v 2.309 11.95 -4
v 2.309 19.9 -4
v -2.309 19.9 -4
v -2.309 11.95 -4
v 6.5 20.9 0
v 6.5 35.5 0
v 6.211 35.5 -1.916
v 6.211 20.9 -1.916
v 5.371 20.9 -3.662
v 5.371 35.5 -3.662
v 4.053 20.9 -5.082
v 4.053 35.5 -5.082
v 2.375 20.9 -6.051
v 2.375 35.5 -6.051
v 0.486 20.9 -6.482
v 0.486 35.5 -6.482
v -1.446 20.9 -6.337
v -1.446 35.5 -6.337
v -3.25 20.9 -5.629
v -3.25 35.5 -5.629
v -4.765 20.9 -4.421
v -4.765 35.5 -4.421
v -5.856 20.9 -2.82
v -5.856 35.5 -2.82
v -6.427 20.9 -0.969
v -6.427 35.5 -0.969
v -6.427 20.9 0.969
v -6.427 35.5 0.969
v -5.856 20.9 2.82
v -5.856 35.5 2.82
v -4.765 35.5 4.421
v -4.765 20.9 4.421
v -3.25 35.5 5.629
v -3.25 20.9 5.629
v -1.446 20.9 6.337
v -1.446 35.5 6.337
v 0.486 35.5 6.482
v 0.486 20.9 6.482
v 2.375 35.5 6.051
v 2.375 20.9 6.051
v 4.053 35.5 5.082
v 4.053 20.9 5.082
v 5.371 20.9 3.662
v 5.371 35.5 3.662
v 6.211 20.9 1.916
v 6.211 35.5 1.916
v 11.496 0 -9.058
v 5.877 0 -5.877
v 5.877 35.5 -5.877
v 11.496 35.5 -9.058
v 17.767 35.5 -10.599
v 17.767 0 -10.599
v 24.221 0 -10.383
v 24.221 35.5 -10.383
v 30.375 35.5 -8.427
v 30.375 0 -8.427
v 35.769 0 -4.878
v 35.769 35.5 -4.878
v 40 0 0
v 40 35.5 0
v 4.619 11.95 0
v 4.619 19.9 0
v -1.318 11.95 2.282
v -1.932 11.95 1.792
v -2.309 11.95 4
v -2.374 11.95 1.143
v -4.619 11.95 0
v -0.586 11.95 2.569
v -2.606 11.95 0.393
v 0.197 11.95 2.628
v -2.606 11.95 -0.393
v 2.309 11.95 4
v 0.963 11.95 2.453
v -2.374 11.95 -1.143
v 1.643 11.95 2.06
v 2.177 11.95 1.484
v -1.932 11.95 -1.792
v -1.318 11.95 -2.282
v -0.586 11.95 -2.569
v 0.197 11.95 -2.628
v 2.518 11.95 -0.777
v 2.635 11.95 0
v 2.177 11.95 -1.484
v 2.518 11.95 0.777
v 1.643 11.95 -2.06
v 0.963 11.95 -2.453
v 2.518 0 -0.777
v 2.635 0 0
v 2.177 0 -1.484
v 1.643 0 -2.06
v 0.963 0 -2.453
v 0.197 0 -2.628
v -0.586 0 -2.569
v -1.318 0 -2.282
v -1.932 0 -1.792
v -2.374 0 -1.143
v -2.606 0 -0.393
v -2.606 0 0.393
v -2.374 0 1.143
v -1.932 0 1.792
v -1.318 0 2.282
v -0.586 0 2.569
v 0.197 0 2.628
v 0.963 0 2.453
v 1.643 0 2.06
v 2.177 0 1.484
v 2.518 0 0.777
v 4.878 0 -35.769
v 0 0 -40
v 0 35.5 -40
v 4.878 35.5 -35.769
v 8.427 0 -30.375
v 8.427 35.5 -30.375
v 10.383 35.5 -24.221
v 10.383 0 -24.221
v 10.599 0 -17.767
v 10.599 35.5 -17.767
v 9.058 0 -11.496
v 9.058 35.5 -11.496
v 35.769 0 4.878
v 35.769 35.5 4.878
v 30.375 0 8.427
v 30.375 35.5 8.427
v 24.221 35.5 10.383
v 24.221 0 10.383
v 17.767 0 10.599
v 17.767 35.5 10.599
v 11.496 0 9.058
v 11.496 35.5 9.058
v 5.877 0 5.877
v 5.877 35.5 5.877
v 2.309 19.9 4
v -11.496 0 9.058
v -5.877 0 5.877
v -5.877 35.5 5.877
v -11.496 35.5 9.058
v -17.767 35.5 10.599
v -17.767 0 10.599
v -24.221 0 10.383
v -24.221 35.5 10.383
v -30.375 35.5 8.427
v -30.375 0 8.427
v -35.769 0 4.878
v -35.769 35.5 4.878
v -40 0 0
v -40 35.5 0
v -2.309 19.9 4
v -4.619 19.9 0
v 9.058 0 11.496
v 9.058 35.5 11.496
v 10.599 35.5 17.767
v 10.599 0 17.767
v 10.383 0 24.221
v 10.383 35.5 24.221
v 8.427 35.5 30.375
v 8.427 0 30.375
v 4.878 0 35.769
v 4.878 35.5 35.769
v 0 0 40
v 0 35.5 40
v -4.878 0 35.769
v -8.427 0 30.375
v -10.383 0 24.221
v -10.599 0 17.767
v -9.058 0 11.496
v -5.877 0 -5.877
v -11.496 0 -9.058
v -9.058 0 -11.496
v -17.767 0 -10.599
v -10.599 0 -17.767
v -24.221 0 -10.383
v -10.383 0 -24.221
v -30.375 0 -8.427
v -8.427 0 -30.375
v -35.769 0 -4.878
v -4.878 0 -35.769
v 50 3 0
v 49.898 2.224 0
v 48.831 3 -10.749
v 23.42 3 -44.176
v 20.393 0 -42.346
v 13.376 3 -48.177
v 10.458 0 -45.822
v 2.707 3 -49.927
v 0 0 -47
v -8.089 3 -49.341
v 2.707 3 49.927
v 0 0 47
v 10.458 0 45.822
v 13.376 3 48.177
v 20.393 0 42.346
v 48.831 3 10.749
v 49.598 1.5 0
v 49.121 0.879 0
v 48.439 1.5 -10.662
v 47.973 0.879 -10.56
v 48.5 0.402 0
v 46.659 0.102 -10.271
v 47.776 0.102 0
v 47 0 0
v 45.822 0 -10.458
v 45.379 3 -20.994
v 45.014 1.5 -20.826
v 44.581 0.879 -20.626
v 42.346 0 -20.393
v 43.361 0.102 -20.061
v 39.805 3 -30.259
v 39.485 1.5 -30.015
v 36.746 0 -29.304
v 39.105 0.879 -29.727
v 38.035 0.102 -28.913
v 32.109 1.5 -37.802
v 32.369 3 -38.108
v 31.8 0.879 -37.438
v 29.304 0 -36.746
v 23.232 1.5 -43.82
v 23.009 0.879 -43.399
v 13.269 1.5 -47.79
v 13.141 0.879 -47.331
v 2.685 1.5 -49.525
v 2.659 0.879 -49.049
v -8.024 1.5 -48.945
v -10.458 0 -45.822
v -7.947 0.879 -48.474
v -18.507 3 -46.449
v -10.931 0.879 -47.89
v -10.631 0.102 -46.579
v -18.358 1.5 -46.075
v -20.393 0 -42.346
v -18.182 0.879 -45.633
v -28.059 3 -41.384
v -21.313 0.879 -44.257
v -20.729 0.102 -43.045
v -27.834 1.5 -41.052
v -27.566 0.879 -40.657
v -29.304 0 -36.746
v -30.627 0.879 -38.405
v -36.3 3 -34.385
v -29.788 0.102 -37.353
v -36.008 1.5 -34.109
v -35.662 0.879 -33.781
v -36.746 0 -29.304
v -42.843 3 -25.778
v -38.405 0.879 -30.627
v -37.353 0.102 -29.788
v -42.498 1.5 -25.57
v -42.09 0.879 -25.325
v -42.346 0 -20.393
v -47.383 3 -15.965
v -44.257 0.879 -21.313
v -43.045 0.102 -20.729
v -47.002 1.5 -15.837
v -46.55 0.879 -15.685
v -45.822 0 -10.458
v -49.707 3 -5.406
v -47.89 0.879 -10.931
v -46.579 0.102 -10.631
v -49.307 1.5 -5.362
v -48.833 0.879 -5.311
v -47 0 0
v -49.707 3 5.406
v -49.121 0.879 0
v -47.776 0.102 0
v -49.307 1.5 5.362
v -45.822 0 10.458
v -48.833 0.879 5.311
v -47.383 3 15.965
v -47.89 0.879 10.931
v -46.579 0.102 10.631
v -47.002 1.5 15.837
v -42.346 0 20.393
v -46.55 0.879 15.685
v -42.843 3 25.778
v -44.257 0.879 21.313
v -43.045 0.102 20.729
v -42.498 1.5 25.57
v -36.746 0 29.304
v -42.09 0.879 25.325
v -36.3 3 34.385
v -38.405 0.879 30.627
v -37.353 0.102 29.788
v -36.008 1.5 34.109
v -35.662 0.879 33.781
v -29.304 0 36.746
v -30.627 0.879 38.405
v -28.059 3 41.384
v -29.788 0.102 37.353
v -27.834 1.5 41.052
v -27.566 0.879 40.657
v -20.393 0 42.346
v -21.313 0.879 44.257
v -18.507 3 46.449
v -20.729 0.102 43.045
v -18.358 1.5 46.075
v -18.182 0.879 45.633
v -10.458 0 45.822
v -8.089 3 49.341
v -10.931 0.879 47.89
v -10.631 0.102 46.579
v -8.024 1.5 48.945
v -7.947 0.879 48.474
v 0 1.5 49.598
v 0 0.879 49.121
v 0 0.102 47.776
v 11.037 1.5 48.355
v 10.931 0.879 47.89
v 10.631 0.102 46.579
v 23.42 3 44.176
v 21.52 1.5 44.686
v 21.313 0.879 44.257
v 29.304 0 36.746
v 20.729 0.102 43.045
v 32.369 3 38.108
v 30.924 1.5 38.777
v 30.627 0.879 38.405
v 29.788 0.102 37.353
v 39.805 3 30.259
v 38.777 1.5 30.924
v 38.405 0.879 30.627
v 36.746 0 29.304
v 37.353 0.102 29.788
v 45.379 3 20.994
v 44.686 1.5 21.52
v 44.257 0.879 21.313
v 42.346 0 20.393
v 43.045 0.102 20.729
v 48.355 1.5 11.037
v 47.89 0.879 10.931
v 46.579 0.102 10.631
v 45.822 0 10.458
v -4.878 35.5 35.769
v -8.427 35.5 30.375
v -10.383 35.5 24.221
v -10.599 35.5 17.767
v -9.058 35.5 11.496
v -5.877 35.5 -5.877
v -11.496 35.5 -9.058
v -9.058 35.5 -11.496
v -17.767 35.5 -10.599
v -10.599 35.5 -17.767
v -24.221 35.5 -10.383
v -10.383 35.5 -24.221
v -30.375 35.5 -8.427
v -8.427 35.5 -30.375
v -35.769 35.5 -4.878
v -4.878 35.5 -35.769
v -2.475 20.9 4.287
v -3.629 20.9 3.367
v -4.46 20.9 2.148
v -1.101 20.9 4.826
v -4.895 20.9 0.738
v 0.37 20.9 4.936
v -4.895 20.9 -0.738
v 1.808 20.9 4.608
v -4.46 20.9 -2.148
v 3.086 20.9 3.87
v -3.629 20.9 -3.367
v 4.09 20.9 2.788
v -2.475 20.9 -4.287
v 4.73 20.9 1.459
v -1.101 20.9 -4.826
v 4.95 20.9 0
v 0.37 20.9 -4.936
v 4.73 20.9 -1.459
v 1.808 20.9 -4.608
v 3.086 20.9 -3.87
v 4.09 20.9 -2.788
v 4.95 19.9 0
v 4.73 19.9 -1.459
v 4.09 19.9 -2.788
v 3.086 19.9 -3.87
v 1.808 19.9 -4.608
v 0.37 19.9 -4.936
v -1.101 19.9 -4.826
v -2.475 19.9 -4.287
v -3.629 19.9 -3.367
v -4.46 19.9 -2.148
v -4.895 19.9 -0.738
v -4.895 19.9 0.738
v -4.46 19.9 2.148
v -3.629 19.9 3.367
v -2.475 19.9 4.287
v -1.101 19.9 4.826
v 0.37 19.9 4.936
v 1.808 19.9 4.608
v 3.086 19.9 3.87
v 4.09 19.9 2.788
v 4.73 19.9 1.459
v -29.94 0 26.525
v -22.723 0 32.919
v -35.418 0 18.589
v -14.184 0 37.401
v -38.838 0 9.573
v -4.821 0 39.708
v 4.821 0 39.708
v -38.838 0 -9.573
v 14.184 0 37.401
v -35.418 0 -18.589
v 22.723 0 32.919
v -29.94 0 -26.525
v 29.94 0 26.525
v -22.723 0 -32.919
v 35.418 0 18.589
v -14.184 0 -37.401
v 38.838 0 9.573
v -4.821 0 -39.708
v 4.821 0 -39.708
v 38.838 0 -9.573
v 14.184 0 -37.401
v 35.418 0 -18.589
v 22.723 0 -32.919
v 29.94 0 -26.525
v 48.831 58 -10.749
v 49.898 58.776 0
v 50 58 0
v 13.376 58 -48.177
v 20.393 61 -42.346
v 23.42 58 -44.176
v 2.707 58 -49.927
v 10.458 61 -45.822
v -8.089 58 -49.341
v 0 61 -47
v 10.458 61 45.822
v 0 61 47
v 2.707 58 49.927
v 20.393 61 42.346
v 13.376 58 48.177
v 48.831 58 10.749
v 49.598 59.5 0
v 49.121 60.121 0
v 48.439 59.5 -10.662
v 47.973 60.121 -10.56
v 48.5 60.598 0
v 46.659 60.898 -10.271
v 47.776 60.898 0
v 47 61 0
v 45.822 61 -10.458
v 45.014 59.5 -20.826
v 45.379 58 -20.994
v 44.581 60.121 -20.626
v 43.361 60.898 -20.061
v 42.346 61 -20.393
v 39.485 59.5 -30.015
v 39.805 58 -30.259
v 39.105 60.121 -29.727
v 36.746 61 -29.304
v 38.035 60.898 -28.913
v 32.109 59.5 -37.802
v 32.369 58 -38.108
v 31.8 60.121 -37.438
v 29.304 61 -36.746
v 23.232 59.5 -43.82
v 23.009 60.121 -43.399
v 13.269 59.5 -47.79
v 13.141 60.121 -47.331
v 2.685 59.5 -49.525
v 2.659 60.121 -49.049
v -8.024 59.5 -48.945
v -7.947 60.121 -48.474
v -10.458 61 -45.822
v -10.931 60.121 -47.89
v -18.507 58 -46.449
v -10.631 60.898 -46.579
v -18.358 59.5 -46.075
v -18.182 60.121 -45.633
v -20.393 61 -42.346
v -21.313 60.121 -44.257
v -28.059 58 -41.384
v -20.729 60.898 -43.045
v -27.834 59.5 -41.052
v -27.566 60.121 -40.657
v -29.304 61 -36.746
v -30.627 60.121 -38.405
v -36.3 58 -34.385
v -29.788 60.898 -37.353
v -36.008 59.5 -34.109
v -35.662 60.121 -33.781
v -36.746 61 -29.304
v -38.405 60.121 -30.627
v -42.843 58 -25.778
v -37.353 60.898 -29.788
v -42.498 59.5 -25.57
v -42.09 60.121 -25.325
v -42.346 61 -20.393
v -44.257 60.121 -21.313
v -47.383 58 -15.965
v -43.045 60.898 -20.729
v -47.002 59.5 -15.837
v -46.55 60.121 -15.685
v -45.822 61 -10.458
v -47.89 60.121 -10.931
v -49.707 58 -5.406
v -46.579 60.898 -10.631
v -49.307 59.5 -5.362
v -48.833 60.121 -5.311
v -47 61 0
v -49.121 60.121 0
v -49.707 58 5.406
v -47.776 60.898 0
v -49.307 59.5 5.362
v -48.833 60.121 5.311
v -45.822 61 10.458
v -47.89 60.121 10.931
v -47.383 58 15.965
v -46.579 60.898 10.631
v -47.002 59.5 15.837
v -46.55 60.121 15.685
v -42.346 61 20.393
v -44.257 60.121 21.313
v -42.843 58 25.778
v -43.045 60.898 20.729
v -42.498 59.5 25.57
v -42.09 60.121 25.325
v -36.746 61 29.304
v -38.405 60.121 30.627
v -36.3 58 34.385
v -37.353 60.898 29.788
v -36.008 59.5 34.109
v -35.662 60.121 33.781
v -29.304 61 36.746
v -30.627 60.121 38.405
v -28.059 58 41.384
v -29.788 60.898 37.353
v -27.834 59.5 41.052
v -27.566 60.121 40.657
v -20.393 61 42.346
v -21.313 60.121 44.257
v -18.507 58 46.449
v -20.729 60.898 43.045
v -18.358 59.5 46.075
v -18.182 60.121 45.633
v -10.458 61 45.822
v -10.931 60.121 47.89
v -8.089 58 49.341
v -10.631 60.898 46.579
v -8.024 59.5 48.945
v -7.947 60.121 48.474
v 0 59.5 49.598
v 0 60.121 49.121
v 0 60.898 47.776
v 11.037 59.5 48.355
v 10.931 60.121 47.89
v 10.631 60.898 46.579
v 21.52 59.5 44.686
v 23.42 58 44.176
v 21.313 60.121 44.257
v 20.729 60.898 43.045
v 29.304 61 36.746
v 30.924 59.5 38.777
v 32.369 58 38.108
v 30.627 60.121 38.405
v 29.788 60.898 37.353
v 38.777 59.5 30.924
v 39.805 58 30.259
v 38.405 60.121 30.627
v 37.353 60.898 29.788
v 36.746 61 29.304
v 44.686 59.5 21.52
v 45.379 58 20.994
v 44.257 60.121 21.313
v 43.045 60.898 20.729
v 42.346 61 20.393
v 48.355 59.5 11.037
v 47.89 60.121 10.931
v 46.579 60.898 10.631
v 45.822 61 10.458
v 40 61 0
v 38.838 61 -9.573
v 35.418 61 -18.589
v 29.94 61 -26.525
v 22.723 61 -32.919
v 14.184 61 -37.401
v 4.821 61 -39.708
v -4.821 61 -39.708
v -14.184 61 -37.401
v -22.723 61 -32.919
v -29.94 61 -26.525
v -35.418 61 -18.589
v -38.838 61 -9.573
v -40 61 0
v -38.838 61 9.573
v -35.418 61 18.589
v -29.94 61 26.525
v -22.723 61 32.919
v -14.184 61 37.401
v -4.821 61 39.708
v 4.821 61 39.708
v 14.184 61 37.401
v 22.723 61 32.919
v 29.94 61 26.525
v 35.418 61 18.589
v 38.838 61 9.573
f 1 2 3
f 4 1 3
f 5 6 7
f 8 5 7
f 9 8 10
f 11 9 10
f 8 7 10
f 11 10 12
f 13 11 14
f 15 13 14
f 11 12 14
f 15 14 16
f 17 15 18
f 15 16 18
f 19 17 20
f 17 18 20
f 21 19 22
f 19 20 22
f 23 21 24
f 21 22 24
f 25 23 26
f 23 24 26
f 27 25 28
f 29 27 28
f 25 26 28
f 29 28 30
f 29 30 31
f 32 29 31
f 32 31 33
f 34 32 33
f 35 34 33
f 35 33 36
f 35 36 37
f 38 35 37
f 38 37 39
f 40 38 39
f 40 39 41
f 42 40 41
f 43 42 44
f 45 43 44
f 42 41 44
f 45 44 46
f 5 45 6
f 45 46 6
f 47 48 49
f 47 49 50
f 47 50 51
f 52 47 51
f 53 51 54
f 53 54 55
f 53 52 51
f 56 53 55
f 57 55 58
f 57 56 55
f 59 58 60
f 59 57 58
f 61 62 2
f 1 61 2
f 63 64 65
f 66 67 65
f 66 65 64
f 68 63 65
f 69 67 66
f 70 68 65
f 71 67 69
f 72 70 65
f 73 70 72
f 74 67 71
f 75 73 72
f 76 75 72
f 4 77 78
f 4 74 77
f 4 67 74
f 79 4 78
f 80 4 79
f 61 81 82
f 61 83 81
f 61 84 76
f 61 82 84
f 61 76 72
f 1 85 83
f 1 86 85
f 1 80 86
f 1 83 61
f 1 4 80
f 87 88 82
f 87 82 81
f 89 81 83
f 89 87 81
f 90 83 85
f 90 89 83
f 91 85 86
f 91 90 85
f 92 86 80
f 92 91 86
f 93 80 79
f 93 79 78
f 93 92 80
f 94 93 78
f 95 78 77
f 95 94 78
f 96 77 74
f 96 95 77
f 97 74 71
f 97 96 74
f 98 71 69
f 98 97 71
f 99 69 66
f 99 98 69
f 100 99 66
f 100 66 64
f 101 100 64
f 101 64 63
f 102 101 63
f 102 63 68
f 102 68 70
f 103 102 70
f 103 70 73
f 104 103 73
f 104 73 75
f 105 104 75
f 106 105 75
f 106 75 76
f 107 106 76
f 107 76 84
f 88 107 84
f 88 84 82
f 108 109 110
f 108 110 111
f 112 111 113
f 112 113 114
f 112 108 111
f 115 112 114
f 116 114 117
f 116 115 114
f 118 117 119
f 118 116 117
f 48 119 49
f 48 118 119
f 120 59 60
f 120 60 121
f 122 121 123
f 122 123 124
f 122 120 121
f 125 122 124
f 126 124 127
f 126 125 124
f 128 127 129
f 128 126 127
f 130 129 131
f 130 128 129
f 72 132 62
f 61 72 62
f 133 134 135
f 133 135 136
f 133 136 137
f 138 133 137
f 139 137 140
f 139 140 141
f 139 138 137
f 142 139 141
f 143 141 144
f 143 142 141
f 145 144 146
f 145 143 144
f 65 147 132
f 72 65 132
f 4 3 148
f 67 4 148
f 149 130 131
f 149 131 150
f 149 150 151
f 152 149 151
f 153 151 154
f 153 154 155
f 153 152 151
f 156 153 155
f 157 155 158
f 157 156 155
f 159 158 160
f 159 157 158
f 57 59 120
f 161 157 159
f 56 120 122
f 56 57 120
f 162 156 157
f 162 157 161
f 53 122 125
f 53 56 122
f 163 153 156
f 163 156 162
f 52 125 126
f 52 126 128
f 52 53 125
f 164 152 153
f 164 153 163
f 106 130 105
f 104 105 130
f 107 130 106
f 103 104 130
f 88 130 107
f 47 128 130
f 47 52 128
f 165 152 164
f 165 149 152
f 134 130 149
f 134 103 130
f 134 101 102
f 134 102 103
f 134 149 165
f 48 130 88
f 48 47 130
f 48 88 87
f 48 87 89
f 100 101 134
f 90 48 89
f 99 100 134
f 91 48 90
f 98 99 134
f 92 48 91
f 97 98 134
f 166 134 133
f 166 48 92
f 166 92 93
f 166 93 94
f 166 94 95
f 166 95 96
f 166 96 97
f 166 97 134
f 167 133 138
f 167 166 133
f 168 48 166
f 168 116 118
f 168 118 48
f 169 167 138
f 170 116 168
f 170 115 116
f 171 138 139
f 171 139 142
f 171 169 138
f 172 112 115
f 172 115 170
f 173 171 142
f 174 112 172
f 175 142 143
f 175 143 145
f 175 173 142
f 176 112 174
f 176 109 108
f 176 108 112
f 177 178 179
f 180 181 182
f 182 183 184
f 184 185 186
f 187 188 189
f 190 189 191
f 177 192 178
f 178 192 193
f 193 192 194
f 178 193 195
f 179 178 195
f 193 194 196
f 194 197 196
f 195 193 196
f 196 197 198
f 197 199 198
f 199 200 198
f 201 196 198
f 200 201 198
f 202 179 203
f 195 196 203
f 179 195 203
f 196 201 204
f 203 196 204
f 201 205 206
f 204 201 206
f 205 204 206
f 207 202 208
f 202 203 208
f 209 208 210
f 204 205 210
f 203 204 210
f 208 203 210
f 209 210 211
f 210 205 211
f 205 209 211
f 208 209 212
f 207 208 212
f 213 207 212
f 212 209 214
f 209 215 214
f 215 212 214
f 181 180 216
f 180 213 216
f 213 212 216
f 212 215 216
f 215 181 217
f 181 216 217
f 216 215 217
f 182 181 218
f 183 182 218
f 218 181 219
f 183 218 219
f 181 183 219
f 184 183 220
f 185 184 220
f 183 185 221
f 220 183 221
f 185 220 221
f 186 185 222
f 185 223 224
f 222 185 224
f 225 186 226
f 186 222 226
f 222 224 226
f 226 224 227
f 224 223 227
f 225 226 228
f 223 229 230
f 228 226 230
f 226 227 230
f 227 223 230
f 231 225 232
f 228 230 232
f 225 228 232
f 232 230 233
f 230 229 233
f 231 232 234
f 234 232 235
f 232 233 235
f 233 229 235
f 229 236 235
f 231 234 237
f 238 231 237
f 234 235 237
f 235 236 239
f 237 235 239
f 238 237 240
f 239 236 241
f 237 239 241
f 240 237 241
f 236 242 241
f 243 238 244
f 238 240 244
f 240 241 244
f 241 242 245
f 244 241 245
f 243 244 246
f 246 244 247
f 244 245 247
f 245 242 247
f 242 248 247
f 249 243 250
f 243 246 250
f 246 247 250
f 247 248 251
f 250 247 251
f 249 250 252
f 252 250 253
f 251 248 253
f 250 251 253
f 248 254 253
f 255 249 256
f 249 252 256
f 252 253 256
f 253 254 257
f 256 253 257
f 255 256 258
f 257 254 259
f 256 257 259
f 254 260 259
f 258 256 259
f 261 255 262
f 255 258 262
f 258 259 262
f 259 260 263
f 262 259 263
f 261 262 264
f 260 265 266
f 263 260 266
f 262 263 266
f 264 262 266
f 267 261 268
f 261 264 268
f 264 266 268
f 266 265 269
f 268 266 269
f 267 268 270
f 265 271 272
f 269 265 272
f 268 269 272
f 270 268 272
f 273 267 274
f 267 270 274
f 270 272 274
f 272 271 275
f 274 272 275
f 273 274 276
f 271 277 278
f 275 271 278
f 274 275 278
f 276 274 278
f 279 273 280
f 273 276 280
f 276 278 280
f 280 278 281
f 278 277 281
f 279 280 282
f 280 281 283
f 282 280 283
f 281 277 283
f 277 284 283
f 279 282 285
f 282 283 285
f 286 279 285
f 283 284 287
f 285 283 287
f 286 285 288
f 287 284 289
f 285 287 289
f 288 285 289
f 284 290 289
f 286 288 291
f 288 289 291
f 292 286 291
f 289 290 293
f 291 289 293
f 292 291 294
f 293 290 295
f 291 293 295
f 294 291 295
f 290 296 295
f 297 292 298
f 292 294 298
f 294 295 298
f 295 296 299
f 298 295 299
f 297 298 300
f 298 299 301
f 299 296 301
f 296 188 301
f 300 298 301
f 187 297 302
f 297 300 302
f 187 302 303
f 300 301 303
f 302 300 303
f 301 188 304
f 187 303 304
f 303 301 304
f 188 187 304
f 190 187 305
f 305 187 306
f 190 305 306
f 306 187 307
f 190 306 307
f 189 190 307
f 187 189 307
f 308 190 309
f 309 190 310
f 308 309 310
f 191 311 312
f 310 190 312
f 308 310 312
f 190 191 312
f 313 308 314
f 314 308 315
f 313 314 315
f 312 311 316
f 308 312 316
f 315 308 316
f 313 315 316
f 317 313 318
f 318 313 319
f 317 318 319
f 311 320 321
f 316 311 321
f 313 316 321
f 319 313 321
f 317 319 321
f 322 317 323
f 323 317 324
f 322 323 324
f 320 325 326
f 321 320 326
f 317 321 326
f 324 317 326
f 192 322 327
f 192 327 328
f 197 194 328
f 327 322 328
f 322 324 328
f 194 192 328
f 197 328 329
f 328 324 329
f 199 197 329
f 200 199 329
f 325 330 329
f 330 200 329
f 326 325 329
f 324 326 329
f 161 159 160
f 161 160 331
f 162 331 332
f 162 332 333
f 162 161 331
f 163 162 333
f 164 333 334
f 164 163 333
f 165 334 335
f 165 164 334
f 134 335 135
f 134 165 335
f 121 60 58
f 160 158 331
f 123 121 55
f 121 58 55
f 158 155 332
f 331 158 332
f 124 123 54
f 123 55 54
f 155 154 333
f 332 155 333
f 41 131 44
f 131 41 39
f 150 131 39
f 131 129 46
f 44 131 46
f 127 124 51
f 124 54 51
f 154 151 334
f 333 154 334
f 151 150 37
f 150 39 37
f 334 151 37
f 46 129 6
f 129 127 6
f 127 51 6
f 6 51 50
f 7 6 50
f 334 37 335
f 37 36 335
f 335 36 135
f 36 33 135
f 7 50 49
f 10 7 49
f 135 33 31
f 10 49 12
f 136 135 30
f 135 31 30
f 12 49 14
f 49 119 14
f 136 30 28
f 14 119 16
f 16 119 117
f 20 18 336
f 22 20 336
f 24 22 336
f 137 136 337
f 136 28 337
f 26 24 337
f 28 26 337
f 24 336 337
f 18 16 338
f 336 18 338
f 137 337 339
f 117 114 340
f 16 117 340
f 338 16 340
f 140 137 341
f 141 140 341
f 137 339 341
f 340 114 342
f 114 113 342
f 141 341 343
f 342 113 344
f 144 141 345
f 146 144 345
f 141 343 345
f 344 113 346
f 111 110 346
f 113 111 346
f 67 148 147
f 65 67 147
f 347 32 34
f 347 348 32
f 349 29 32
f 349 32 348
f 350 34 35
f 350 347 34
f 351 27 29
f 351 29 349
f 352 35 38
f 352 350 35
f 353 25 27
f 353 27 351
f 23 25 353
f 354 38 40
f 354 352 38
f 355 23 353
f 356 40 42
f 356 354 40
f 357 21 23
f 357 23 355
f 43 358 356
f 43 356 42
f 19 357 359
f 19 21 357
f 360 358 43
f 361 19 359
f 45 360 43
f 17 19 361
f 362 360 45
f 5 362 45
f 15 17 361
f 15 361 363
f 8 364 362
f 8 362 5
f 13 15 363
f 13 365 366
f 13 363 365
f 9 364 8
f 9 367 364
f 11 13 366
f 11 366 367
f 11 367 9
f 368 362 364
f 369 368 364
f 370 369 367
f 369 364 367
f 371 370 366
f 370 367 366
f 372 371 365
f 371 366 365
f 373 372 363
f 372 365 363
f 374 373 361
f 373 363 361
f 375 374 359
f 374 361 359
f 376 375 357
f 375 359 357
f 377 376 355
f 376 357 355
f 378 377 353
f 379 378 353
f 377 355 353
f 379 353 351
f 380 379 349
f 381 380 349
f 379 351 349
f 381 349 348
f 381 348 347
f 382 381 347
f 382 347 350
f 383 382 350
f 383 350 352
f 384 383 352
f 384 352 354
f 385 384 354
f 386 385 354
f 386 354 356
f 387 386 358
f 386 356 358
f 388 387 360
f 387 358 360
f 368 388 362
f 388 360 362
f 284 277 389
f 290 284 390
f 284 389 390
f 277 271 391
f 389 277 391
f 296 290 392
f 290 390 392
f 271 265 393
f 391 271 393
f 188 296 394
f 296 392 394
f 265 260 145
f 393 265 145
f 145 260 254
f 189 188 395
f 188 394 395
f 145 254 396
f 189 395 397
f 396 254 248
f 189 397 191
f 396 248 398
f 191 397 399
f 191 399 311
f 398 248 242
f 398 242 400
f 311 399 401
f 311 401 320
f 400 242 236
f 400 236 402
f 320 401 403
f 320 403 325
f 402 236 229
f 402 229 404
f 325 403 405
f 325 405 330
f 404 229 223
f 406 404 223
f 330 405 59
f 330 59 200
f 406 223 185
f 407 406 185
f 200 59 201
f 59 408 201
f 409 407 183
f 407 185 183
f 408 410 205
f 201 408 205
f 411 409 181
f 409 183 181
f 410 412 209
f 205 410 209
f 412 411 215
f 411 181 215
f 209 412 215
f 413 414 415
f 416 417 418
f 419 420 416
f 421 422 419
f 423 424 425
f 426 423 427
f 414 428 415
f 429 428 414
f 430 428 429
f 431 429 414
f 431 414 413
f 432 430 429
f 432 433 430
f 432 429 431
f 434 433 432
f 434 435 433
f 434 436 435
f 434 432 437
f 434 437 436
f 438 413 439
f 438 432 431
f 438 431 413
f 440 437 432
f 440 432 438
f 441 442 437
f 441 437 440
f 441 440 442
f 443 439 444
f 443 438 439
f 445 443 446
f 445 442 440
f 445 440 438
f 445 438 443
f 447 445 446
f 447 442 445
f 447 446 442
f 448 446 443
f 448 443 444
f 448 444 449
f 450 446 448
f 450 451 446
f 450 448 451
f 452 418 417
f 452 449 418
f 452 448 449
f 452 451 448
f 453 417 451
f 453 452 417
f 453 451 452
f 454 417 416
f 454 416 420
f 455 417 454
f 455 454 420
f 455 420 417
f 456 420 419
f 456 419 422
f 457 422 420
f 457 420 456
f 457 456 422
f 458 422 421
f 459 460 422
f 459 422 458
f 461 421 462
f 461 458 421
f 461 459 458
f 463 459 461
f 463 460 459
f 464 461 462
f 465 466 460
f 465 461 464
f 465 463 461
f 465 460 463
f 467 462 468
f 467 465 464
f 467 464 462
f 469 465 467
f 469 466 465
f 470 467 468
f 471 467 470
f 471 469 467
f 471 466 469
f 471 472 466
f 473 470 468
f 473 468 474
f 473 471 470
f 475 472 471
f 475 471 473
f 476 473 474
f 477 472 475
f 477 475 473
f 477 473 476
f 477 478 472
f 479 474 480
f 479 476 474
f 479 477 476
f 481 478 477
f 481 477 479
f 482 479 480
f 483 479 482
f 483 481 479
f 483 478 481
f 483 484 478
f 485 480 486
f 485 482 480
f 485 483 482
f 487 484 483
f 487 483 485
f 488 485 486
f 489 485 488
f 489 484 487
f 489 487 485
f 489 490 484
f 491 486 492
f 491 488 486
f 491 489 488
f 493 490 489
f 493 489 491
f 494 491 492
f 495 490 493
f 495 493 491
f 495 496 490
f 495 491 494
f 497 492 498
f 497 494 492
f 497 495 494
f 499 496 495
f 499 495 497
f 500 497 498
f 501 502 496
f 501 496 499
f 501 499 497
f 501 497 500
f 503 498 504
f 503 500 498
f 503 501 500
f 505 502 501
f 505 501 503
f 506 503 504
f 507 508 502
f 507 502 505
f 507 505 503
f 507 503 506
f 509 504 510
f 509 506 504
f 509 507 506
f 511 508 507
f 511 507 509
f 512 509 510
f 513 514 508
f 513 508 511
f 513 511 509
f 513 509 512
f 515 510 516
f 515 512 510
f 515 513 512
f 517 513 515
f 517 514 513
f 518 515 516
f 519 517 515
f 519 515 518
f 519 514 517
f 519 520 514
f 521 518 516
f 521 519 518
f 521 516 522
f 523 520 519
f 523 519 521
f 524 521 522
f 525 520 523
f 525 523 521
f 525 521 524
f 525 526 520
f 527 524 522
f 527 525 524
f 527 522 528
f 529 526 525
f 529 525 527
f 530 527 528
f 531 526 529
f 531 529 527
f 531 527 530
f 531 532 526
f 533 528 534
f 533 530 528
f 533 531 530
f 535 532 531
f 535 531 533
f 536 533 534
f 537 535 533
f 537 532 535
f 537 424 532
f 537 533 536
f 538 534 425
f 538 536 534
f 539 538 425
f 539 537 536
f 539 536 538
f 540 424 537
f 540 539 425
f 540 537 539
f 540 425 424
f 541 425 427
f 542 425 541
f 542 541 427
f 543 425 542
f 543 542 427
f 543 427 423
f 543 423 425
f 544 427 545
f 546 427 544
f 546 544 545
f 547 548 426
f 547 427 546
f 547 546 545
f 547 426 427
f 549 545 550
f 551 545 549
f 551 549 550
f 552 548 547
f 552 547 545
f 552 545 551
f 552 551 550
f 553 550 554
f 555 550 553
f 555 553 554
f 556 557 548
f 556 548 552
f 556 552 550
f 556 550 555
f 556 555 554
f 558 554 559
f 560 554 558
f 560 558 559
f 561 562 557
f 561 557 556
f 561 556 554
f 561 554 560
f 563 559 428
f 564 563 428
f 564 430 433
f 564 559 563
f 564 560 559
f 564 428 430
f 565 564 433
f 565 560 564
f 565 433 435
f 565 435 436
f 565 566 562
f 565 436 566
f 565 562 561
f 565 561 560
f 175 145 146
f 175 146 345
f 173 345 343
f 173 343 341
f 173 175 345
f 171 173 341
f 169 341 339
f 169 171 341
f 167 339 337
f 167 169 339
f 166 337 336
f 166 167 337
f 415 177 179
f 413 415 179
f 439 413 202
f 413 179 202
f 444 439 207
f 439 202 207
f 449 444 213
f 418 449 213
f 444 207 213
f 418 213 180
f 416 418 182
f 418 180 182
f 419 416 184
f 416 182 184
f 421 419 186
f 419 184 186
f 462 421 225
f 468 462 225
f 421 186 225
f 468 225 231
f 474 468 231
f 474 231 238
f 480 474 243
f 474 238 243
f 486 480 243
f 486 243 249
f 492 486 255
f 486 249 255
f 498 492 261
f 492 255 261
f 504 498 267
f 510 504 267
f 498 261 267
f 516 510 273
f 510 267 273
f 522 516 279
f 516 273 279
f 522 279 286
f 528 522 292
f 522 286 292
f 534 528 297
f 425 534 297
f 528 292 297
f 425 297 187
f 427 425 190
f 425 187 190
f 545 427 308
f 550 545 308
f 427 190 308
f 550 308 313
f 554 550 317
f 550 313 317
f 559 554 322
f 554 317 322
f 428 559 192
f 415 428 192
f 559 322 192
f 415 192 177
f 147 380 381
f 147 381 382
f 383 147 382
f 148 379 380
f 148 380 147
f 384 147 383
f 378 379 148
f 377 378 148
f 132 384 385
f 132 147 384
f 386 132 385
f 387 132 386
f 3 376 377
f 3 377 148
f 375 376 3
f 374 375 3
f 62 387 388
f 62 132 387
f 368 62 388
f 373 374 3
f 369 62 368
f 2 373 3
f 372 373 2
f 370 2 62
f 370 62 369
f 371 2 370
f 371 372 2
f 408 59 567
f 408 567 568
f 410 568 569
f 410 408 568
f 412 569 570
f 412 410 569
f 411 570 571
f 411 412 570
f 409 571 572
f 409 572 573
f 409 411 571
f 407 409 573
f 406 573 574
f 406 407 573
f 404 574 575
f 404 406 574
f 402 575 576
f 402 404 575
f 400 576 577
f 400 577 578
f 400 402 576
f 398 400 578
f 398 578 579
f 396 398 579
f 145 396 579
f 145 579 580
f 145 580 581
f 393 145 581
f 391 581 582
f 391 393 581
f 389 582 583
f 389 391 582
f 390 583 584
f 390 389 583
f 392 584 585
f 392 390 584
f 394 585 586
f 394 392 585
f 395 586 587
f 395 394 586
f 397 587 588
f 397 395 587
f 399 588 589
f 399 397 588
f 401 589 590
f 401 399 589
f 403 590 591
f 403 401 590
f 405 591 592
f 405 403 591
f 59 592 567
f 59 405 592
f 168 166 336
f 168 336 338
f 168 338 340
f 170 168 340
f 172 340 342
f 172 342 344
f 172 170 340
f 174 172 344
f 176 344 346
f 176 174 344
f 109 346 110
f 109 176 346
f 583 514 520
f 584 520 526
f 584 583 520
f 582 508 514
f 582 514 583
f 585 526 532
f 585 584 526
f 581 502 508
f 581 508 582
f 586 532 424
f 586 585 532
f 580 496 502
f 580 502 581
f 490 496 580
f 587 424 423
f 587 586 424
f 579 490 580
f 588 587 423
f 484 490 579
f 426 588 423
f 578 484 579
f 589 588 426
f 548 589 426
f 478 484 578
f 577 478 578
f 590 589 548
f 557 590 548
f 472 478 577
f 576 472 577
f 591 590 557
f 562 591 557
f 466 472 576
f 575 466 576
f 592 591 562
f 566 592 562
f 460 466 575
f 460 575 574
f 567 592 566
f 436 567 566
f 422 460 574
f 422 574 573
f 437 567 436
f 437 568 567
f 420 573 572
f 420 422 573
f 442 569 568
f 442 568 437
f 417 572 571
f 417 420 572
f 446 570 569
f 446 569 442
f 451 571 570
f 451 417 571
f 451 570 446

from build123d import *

# Parameters (mm, degrees)
SKETCH1_R           = 50
SKETCH1_R_2         = 40
BOSS_EXTRUDE1_DEPTH = 61
SKETCH1_3_R         = 2.635
BOSS_EXTRUDE2_DEPTH = 35.5
FILLET1_R           = 3
SKETCH2_R           = 6.5
CUT_EXTRUDE1_DEPTH  = 14.6
SKETCH3_R           = 4.95
CUT_EXTRUDE2_DEPTH  = 1
CUT_EXTRUDE3_START  = -1
SKETCH3_3_R         = 2.635
CUT_EXTRUDE3_DEPTH  = 7.95


with BuildPart() as part:
    # Sketch1 → Boss-Extrude1 (new body)
    with BuildSketch(Plane(origin=(0, 0, 0), x_dir=(1, 0, 0), z_dir=(0, 1, 0))):
        Circle(SKETCH1_R)
        Circle(SKETCH1_R_2, mode=Mode.SUBTRACT)
    extrude(amount=BOSS_EXTRUDE1_DEPTH)

    # Fillet1
    fillet1_edges = [part.edges().sort_by_distance(p)[0] for p in [
        (-50, 61, 0),
        (-50, 0, 0),
    ]]
    fillet(fillet1_edges, radius=FILLET1_R)


with BuildPart() as body_2:
    # Sketch1<3> → Boss-Extrude2 (new body)
    with BuildSketch(Plane(origin=(0, 0, 0), x_dir=(1, 0, 0), z_dir=(0, 1, 0))):
        with BuildLine():
            ThreePointArc((5.877030144, 5.877030144), (24.220657484, 10.382837425), (40, 0))
            ThreePointArc((40, 0), (24.220657484, -10.382837425), (5.877030144, -5.877030144))
            ThreePointArc((5.877030144, -5.877030144), (10.382837425, -24.220657484), (0, -40))
            ThreePointArc((0, -40), (-10.382837425, -24.220657484), (-5.877030144, -5.877030144))
            ThreePointArc((-5.877030144, -5.877030144), (-24.220657484, -10.382837425), (-40, 0))
            ThreePointArc((-40, 0), (-24.220657484, 10.382837425), (-5.877030144, 5.877030144))
            ThreePointArc((-5.877030144, 5.877030144), (-10.382837425, 24.220657484), (0, 40))
            ThreePointArc((0, 40), (10.382837425, 24.220657484), (5.877030144, 5.877030144))
        make_face()
        Circle(SKETCH1_3_R, mode=Mode.SUBTRACT)
    extrude(amount=BOSS_EXTRUDE2_DEPTH)

    # Sketch2 → Cut-Extrude1 (cut)
    with BuildSketch(Plane(origin=(0, 35.5, 0), x_dir=(1, 0, 0), z_dir=(0, 1, 0))):
        Circle(SKETCH2_R)
    extrude(amount=-CUT_EXTRUDE1_DEPTH, mode=Mode.SUBTRACT)

    # Sketch3 → Cut-Extrude2 (cut)
    with BuildSketch(Plane(origin=(0, 20.9, 0), x_dir=(1, 0, 0), z_dir=(0, 1, 0))):
        Circle(SKETCH3_R)
    extrude(amount=-CUT_EXTRUDE2_DEPTH, mode=Mode.SUBTRACT)

    # Sketch3<3> → Cut-Extrude3 (cut)
    with BuildSketch(Plane(origin=(0, 20.9, 0), x_dir=(1, 0, 0), z_dir=(0, 1, 0)).offset(CUT_EXTRUDE3_START)):
        Polygon((2.309401077, -4), (4.618802154, 0), (2.309401077, 4), (-2.309401077, 4), (-4.618802154, 0), (-2.309401077, -4), align=None)
        Circle(SKETCH3_3_R, mode=Mode.SUBTRACT)
    extrude(amount=-CUT_EXTRUDE3_DEPTH, mode=Mode.SUBTRACT)


solid = Compound([part.part, body_2.part])
